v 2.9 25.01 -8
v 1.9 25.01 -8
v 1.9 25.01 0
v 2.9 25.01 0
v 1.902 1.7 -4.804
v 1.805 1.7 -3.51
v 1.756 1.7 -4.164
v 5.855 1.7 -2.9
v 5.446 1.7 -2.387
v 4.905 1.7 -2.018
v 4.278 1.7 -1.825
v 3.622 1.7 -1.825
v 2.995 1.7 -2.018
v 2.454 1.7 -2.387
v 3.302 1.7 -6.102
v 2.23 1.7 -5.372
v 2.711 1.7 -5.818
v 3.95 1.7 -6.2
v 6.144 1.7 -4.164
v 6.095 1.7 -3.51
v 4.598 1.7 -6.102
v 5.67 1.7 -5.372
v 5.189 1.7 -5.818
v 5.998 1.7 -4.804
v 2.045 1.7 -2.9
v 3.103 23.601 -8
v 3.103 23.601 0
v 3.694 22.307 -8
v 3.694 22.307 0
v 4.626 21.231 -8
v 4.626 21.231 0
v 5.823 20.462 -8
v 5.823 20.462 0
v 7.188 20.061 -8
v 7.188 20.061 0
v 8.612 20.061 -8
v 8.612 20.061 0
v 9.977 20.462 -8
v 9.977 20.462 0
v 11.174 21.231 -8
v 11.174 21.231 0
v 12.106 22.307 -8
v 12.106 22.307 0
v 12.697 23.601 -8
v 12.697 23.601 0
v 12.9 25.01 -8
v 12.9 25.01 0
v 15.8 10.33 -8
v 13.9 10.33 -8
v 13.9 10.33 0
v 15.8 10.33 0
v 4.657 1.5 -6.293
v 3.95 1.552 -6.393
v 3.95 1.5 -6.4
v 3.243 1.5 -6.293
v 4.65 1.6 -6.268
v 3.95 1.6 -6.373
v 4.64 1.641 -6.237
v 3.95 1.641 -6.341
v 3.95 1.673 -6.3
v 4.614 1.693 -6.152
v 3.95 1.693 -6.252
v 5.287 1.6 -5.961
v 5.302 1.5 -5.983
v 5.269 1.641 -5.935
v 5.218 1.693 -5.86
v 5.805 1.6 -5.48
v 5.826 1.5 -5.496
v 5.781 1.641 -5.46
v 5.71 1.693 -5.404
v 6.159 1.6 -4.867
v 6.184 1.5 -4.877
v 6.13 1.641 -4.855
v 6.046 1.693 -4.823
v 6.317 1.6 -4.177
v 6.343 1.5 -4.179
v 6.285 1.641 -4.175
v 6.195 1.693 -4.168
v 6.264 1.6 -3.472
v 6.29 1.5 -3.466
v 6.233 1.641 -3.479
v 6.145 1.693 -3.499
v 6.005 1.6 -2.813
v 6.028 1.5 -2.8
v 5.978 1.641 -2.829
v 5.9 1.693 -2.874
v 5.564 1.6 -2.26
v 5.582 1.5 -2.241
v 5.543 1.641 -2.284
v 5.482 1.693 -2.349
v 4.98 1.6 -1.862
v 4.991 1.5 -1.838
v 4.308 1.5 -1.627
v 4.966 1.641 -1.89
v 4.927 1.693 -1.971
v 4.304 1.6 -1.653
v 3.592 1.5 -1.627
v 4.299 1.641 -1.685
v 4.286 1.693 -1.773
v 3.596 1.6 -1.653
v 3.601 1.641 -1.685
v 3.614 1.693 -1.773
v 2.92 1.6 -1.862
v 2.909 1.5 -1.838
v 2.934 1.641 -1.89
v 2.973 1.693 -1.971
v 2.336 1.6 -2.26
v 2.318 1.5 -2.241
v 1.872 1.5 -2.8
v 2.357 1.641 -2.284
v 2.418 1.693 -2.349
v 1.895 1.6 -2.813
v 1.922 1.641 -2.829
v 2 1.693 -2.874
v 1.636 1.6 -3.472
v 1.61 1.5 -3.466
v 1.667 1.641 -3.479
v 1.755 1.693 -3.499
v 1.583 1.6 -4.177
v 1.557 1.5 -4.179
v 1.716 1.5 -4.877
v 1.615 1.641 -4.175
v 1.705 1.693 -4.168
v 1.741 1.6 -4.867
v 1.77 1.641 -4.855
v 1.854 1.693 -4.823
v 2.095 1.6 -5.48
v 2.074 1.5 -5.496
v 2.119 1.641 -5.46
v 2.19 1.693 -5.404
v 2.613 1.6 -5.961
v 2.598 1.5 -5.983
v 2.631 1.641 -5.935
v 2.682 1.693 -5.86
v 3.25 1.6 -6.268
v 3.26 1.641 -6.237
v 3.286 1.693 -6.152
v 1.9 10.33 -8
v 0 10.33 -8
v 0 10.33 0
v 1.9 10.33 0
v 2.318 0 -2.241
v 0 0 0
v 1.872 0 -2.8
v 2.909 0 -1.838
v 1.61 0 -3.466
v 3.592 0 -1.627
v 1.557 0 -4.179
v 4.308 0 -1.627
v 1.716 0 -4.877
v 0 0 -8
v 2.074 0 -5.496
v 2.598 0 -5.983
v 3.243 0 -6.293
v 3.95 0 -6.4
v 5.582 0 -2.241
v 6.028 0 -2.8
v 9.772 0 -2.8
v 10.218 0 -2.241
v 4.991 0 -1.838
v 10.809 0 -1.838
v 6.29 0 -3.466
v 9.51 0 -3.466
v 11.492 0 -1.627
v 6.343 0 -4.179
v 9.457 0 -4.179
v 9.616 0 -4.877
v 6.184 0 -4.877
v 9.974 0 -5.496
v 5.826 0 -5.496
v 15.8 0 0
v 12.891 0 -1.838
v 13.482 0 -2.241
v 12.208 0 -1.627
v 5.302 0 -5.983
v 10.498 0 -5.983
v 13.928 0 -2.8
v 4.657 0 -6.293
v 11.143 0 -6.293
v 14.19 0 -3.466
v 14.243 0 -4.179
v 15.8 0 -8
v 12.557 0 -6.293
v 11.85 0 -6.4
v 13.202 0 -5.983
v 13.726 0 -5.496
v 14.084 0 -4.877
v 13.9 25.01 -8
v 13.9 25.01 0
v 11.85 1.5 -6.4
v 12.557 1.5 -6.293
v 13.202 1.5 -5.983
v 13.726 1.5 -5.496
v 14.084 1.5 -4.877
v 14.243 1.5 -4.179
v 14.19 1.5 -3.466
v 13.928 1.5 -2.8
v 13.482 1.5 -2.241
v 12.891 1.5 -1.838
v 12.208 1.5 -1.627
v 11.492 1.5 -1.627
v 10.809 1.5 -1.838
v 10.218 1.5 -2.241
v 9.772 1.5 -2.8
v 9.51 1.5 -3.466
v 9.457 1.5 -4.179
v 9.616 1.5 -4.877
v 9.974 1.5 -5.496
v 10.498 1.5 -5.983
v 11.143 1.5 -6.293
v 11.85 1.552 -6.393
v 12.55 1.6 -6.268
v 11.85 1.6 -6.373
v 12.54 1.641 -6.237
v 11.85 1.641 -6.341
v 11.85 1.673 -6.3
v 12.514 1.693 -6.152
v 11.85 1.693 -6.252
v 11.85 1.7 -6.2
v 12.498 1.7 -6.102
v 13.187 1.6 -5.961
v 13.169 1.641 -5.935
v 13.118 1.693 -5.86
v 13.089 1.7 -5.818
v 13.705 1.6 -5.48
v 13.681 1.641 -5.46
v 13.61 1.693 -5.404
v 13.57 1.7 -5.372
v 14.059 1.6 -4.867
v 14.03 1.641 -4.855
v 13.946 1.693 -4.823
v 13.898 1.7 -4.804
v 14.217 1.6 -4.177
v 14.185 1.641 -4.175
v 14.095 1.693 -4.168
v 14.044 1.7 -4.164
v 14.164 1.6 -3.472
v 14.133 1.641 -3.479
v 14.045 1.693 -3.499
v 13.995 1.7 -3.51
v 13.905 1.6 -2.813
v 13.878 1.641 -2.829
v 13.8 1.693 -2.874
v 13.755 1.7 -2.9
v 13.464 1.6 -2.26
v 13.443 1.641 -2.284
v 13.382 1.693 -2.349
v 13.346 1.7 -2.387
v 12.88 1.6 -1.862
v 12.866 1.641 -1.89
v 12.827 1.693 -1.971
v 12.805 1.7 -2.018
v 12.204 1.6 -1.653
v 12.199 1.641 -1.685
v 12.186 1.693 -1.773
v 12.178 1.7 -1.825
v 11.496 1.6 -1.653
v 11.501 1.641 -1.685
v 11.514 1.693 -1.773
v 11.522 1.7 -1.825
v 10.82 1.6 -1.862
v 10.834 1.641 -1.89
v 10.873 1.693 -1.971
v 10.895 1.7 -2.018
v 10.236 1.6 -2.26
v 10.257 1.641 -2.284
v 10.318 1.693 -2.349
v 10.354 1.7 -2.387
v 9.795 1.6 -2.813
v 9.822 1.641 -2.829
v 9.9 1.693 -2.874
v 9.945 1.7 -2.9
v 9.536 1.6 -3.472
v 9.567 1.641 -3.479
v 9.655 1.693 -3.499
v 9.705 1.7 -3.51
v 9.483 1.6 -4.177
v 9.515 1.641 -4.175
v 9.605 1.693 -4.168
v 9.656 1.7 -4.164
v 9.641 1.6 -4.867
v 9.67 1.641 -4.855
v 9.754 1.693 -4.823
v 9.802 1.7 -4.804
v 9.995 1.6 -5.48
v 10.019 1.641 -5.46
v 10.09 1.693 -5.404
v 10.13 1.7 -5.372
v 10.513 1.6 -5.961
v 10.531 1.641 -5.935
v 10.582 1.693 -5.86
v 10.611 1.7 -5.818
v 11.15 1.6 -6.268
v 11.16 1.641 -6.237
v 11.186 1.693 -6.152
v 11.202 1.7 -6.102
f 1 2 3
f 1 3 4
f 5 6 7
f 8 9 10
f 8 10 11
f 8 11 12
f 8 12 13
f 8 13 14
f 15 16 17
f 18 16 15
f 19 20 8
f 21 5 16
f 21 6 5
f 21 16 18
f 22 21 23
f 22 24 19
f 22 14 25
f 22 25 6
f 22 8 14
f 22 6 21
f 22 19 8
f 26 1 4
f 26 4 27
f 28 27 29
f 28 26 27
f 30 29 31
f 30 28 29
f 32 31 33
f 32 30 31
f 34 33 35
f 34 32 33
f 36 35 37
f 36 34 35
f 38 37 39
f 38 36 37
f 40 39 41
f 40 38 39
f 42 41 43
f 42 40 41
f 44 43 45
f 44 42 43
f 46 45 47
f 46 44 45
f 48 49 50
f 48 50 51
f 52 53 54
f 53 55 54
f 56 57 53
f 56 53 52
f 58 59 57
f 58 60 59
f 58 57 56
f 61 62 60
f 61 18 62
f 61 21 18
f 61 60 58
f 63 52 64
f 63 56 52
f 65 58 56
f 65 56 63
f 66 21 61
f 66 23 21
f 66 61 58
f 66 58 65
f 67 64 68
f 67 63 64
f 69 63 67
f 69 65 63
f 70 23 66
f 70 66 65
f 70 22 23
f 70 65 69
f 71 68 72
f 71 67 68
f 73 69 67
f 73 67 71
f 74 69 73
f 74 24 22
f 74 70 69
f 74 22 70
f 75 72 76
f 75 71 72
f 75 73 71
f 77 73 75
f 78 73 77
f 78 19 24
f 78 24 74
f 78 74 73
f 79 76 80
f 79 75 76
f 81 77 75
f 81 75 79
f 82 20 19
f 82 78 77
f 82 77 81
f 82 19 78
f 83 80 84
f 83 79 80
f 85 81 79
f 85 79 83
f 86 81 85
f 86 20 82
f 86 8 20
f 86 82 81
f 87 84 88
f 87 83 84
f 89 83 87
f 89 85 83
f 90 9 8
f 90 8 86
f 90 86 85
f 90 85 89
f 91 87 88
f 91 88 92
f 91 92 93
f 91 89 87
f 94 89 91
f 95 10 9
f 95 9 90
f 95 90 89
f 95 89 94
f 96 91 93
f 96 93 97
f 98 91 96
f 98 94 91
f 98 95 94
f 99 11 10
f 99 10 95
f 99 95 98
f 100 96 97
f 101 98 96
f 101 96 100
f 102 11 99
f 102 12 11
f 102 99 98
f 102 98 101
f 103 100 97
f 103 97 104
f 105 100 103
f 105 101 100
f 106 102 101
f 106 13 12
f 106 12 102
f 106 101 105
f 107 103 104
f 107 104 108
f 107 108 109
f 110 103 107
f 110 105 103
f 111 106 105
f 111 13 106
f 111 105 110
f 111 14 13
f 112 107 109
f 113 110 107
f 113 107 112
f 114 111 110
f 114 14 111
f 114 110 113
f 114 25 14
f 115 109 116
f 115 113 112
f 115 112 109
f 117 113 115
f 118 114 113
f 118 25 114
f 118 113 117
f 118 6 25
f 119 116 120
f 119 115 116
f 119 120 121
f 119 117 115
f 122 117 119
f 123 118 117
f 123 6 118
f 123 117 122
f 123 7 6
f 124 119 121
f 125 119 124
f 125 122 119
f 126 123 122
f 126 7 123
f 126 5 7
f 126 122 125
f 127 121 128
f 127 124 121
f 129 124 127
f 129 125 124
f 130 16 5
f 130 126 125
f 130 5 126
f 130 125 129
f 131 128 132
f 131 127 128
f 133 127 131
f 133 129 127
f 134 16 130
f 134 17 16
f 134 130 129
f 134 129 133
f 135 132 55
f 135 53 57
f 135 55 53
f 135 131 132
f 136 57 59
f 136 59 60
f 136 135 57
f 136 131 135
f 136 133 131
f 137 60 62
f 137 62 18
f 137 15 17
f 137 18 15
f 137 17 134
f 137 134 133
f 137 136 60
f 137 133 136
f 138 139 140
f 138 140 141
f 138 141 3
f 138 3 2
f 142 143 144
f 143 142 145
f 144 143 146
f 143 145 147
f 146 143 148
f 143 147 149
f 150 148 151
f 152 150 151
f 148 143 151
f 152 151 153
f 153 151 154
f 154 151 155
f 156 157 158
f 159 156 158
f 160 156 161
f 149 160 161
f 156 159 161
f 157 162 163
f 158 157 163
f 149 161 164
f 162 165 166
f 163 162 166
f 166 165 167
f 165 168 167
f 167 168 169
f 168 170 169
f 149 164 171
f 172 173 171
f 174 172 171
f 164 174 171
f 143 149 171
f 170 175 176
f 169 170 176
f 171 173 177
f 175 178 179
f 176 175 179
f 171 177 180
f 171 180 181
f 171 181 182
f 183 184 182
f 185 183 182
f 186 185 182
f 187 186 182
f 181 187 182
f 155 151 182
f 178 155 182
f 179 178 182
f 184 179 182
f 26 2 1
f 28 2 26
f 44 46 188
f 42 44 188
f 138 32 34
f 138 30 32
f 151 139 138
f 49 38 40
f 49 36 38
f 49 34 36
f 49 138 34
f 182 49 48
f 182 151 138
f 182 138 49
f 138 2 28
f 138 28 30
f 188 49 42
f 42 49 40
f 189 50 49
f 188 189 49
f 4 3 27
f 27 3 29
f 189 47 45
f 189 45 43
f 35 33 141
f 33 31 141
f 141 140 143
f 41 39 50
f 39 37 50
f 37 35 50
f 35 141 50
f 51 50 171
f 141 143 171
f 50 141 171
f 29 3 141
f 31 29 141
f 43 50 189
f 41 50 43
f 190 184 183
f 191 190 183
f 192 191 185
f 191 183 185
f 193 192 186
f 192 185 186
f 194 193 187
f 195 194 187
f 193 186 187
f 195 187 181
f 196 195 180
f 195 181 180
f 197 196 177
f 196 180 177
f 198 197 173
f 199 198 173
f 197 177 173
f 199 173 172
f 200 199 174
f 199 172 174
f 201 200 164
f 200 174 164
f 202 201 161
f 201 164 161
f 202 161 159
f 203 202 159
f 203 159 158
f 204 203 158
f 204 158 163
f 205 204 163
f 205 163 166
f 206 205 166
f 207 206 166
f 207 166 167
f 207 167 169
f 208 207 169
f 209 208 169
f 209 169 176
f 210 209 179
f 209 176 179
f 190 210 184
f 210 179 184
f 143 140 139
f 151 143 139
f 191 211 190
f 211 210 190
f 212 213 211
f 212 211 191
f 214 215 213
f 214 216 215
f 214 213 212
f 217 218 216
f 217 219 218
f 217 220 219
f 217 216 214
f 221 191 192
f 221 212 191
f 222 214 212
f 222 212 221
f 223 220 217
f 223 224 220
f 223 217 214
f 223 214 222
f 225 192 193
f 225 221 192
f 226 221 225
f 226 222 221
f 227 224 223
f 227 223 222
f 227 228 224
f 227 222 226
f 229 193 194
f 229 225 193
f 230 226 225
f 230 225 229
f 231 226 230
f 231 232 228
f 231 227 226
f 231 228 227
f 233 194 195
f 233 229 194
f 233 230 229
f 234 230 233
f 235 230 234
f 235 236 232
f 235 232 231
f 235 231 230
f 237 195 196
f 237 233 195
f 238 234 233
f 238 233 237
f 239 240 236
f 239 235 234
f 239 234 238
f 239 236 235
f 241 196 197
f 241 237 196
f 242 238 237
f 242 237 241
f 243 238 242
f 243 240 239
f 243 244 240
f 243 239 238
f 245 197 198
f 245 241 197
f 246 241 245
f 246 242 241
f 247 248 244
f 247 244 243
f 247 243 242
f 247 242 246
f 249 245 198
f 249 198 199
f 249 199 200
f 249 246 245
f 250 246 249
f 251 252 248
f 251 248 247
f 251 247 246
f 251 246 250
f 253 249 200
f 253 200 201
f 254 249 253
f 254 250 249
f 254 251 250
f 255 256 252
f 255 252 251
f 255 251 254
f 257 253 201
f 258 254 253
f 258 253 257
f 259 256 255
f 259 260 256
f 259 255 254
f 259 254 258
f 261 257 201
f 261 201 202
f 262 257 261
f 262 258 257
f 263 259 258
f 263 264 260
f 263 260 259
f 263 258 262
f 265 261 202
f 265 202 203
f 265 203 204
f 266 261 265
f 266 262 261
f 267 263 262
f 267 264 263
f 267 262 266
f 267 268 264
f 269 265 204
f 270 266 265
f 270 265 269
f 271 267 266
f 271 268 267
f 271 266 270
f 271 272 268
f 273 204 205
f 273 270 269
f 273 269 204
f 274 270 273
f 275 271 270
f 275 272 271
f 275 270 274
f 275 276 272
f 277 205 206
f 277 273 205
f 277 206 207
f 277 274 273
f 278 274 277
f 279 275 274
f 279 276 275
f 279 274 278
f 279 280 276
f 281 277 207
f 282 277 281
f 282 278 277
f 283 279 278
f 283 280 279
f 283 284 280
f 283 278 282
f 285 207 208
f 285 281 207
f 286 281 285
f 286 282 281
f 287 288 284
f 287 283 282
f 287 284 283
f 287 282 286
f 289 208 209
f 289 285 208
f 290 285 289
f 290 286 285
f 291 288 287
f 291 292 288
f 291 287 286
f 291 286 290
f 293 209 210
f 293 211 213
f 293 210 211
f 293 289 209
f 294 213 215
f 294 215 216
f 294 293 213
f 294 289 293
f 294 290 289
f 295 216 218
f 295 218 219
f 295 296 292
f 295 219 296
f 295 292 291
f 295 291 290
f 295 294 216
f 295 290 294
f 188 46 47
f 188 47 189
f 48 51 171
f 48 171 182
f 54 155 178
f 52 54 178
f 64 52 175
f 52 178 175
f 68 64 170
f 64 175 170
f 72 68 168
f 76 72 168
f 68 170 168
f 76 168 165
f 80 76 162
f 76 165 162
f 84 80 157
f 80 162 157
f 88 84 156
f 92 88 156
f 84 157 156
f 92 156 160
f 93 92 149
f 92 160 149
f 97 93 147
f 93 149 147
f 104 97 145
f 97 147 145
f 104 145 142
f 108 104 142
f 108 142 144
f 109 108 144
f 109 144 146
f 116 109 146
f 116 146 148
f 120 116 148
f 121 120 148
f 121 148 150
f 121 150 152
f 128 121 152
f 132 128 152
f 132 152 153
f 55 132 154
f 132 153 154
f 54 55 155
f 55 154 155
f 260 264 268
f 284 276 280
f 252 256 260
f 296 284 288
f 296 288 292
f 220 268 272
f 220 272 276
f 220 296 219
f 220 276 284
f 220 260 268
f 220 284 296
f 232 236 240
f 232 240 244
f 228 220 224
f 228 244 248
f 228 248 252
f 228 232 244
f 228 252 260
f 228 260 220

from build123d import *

# Parameters (mm, degrees)
ESQUISSE1_W                  = 15.8
ESQUISSE1_H                  = 8
BOSS_EXTRU_1_DEPTH           = 25.01
ESQUISSE2_R                  = 2.4
ENL_V_MAT_EXTRU_1_DEPTH      = 1.7
ESQUISSE3_W                  = 1.9
ESQUISSE3_H                  = 8
ENL_V_MAT_EXTRU_2_DEPTH      = 14.68
CONG_1_R                     = 0.2
ENL_V_MAT_EXTRU_4_DEPTH      = 31.645392802
ENL_V_MAT_EXTRU_4_DEPTH_BACK = 31.645392802


with BuildPart() as part:
    # Esquisse1 → Boss.-Extru.1 (new body)
    with BuildSketch(Plane(origin=(0, 0, 0), x_dir=(1, 0, 0), z_dir=(0, 1, 0))):
        with Locations((7.9, 4)):
            Rectangle(ESQUISSE1_W, ESQUISSE1_H)
    extrude(amount=BOSS_EXTRU_1_DEPTH)

    # Esquisse2 → Enlèv. mat.-Extru.1 (cut)
    with BuildSketch(Plane.XZ):
        with Locations(Location((3.95, -4, 0), (0, 0, 270))):
            Circle(ESQUISSE2_R)
        with Locations(Location((11.85, -4, 0), (0, 0, 270))):
            Circle(ESQUISSE2_R)
    extrude(amount=-ENL_V_MAT_EXTRU_1_DEPTH, mode=Mode.SUBTRACT)

    # Esquisse3 → Enlèv. mat.-Extru.2 (cut)
    with BuildSketch(Plane(origin=(0, 25.01, 0), x_dir=(1, 0, 0), z_dir=(0, 1, 0))):
        with Locations((0.95, 4)):
            Rectangle(ESQUISSE3_W, ESQUISSE3_H)
        with Locations((14.85, 4)):
            Rectangle(ESQUISSE3_W, ESQUISSE3_H)
    extrude(amount=-ENL_V_MAT_EXTRU_2_DEPTH, mode=Mode.SUBTRACT)

    # Congé1
    cong_1_edges = [part.edges().sort_by_distance(p)[0] for p in [
        (3.95, 1.7, -1.6),
        (11.85, 1.7, -1.6),
    ]]
    fillet(cong_1_edges, radius=CONG_1_R)

    # Esquisse5 → Enlèv. mat.-Extru.4 (cut, two sides: drawn at the far end of the back side and taken through both)
    with BuildSketch(Plane.XY.offset(-ENL_V_MAT_EXTRU_4_DEPTH_BACK)):
        with BuildLine():
            Line((2.9, 91.29179457), (2.9, 25.01))
            ThreePointArc((2.9, 25.01), (7.9, 20.01), (12.9, 25.01))
            Line((12.9, 25.01), (12.9, 91.29179457))
            Line((12.9, 91.29179457), (12.9, 223.855383709))
            Line((12.9, 223.855383709), (2.9, 223.855383709))
            Line((2.9, 223.855383709), (2.9, 91.29179457))
        make_face()
    extrude(amount=ENL_V_MAT_EXTRU_4_DEPTH + ENL_V_MAT_EXTRU_4_DEPTH_BACK, mode=Mode.SUBTRACT)


solid = part.part
